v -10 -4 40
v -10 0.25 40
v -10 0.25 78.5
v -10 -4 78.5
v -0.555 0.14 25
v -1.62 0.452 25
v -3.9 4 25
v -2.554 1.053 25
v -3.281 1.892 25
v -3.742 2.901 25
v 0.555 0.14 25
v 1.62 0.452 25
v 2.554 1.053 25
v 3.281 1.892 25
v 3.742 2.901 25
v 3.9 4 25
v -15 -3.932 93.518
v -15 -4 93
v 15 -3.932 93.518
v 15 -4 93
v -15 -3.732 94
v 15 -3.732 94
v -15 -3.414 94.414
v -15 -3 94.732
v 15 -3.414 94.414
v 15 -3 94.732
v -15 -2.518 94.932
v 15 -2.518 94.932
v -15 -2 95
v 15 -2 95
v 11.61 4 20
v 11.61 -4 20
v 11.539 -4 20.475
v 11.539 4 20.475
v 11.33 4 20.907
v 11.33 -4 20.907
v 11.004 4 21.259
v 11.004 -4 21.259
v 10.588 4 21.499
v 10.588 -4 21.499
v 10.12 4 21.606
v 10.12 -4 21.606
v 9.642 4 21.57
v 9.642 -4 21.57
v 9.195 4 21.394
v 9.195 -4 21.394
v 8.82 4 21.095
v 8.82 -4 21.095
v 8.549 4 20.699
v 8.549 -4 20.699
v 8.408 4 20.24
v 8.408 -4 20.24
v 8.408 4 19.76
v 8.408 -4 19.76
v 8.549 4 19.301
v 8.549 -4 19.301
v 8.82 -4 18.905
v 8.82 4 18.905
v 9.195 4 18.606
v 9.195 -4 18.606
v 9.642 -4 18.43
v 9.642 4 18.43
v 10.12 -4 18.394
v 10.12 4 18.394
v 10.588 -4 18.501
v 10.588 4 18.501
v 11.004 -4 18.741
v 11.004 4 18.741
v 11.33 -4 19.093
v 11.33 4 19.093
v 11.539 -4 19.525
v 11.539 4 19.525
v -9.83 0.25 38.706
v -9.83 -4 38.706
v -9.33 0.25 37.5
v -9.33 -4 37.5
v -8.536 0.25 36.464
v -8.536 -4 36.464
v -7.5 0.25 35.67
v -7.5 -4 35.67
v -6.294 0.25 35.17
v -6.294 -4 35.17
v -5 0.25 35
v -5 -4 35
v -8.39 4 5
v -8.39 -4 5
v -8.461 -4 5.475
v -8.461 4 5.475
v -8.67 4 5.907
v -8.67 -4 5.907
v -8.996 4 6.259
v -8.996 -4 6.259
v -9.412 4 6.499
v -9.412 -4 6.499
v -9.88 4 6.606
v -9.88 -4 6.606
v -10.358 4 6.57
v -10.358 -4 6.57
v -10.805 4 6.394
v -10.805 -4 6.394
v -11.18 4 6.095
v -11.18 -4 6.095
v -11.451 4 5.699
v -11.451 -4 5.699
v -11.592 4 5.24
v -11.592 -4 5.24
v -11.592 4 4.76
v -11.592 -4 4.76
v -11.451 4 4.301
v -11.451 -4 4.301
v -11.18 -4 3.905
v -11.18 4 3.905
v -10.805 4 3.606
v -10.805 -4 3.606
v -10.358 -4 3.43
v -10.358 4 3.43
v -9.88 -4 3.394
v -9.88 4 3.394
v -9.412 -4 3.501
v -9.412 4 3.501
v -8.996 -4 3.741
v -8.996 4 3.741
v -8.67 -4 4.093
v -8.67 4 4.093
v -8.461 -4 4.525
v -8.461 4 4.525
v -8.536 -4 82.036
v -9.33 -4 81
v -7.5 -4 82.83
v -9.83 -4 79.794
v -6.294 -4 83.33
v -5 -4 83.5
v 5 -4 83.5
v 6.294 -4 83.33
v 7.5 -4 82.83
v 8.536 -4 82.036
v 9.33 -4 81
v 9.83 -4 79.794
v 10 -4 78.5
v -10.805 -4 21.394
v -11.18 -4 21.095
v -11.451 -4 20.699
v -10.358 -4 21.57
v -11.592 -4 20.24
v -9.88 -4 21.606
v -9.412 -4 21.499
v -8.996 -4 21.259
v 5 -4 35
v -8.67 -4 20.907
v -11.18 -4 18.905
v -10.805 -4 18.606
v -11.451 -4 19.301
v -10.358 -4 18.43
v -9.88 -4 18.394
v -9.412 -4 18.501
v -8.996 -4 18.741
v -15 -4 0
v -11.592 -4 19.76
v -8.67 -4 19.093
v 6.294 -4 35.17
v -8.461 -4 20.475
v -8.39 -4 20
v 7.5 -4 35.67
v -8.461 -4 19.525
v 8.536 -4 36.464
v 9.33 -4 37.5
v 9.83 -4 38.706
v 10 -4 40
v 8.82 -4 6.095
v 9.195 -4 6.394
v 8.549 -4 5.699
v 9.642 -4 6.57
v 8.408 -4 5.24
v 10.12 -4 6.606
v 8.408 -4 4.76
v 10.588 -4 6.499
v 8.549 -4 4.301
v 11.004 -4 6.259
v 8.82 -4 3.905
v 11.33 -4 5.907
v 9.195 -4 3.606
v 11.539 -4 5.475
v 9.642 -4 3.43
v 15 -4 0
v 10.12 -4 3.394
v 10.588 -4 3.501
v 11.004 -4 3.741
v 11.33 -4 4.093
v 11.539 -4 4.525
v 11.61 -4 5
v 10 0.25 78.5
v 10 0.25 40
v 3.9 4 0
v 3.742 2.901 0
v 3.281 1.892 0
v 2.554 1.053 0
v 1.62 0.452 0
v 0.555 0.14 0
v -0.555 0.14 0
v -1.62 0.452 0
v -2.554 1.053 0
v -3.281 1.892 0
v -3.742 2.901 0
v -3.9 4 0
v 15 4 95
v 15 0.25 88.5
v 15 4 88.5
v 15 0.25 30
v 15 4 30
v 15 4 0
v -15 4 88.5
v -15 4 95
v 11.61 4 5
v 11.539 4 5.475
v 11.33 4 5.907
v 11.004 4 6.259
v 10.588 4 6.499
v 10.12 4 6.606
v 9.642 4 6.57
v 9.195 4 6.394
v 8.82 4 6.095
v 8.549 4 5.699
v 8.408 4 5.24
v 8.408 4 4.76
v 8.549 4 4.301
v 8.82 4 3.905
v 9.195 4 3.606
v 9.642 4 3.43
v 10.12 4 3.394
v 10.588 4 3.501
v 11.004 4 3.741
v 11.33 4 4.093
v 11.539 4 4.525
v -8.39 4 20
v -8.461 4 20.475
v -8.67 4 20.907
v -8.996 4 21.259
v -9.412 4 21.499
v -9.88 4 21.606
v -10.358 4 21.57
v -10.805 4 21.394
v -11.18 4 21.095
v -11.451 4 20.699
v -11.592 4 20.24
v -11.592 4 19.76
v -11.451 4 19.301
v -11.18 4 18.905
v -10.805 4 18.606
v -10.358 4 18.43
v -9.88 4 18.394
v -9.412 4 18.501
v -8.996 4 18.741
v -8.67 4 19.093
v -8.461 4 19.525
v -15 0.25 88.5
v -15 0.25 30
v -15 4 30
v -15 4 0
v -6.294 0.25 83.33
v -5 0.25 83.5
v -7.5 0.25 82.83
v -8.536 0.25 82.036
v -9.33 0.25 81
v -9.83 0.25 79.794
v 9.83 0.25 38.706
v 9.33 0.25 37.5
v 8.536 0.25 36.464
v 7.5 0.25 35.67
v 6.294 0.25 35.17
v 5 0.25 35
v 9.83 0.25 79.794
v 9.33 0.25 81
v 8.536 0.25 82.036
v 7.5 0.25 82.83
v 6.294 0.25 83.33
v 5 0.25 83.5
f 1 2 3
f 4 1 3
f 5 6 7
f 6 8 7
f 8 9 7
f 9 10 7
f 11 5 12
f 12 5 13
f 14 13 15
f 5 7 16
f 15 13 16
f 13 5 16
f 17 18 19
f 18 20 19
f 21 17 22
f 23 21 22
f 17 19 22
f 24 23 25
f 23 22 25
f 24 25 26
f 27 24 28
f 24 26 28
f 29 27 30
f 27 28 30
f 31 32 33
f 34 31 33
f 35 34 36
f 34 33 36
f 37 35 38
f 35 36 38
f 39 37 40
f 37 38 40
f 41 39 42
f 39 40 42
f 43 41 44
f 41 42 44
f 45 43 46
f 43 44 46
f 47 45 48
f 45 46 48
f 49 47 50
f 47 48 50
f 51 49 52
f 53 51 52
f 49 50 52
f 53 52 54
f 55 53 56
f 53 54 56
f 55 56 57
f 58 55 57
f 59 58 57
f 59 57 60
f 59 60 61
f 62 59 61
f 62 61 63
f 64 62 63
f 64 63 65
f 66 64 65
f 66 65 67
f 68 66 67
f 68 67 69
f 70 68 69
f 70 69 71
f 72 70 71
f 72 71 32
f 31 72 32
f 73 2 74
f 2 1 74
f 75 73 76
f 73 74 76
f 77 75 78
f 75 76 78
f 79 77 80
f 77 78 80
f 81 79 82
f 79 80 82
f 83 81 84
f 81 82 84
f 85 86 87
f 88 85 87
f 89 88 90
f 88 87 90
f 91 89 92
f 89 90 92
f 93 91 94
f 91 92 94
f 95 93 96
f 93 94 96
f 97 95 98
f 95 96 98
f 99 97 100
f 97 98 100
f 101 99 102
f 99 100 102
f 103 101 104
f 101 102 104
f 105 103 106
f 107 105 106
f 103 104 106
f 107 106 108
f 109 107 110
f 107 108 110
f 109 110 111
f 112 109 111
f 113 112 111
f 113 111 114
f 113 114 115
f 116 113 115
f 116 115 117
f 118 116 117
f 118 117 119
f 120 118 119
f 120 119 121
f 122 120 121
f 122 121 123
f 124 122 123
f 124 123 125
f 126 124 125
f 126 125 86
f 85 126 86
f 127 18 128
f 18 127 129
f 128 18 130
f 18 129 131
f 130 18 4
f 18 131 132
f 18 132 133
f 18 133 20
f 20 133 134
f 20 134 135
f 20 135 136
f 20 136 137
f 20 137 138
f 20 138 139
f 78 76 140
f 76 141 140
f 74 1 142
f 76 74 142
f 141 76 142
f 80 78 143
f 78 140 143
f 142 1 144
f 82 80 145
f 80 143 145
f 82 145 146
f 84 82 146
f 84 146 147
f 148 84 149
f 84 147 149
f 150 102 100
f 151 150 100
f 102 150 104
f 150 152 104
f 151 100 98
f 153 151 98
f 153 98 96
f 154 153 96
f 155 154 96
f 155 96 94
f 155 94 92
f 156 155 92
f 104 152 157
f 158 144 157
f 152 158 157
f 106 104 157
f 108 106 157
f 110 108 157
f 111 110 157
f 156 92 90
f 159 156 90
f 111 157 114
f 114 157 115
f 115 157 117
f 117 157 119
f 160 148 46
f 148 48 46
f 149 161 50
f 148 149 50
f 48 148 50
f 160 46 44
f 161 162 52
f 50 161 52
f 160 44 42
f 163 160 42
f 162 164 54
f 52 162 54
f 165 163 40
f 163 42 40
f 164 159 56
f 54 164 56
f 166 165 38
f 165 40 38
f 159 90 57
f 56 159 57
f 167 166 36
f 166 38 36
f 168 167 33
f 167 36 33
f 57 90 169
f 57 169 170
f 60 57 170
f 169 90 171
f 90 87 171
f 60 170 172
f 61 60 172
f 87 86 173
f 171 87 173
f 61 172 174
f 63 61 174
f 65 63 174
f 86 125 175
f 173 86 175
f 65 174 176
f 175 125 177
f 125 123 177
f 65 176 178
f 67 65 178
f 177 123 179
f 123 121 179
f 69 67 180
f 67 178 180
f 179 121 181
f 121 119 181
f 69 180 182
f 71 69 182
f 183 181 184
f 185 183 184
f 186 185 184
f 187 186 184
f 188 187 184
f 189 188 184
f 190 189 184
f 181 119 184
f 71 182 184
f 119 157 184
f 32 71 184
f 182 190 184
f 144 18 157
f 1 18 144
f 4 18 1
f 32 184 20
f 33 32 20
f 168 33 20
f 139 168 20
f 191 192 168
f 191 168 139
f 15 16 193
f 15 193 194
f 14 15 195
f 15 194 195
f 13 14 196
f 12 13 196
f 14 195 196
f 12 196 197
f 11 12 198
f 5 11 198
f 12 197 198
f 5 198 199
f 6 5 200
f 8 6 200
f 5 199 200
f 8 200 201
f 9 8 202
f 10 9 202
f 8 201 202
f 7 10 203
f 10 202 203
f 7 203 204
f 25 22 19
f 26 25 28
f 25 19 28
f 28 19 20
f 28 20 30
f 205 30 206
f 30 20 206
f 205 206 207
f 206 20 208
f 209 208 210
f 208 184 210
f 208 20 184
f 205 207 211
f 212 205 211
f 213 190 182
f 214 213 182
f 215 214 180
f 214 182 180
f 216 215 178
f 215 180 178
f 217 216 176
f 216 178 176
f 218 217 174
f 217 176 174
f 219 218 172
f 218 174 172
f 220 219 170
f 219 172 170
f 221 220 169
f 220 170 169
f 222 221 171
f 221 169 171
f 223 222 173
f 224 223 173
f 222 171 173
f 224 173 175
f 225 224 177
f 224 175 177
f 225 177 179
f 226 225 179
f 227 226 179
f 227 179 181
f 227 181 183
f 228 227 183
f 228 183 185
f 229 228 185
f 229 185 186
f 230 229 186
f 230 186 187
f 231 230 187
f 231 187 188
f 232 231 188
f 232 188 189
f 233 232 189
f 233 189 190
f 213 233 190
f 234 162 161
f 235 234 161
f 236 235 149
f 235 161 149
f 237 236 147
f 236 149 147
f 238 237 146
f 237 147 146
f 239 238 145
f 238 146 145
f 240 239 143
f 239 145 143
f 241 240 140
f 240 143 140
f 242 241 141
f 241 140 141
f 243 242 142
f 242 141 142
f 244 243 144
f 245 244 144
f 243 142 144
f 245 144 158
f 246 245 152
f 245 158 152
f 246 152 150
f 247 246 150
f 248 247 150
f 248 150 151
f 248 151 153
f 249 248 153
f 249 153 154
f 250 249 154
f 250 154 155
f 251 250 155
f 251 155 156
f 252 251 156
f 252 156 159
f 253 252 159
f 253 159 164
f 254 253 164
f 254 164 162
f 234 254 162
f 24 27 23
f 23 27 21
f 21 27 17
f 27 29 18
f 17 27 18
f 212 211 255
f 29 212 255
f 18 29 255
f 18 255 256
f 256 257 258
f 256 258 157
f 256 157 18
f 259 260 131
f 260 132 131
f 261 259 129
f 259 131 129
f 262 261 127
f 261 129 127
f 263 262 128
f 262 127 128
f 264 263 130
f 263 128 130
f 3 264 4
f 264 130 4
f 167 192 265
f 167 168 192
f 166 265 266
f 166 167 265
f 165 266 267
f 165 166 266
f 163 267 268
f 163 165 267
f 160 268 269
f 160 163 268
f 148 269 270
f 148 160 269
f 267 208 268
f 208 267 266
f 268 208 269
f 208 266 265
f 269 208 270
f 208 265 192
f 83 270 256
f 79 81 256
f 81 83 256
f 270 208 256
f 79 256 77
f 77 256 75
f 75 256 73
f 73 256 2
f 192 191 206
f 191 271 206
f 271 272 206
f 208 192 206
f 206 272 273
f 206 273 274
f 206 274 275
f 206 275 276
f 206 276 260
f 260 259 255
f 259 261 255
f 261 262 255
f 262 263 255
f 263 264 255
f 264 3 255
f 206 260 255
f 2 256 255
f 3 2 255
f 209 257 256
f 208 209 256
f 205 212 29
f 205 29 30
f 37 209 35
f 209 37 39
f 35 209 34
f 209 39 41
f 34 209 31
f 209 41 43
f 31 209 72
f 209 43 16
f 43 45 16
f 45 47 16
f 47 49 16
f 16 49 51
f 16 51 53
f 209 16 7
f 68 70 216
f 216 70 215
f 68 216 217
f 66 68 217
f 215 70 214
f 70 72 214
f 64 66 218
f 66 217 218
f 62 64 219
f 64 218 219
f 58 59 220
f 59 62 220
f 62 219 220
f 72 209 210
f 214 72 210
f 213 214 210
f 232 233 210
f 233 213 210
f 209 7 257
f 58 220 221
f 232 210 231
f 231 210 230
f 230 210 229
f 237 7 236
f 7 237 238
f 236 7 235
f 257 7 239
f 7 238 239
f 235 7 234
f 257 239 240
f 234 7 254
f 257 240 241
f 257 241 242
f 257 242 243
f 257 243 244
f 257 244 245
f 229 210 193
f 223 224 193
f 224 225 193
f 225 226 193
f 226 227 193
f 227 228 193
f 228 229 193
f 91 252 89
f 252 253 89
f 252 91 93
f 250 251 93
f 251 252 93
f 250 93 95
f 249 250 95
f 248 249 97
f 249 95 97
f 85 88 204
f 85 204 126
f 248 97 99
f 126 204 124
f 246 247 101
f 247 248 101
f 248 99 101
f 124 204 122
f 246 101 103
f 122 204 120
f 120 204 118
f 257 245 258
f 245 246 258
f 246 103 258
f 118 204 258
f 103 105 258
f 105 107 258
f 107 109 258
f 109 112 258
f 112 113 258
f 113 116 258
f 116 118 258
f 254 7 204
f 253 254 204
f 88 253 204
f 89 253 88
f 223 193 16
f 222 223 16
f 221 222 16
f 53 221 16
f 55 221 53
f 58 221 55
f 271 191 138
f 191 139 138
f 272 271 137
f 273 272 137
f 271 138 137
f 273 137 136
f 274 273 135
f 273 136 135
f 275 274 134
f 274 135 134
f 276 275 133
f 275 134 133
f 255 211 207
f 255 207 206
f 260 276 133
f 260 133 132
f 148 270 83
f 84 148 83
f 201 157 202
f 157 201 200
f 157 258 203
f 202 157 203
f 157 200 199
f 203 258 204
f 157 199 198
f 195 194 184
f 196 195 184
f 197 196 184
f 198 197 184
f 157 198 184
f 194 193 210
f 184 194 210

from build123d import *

# Parameters (mm, degrees)
F1_DEPTH = 25
F2_R     = 1.6101418037
F3_DEPTH = 25
F5_DEPTH = 70
F6_W     = 3.75
F6_H     = 58.5
F7_DEPTH = 30.001
F8_W     = 20
F8_H     = 48.5
F9_DEPTH = 25
F10_R    = 5
F11_R    = 2


with BuildPart() as f1:
    # F0 (on Top) → F1 (new body)
    with BuildSketch(Plane.XY):
        with BuildLine():
            Line((15, 4), (3.9, 4))
            ThreePointArc((3.9, 4), (0, 0.1), (-3.9, 4))
            Line((-3.9, 4), (-15, 4))
            Line((-15, 4), (-15, -4))
            Line((-15, -4), (15, -4))
            Line((15, -4), (15, 4))
        make_face()
    extrude(amount=F1_DEPTH)

    # F2 (on face) → F3 (cut)
    with BuildSketch(Plane.XZ.offset(4)):
        with Locations((-10, 20)):
            Circle(F2_R)
        with Locations((-10, 5)):
            Circle(F2_R)
        with Locations((10, 20)):
            Circle(F2_R)
        with Locations((10, 5)):
            Circle(F2_R)
    extrude(amount=-F3_DEPTH, mode=Mode.SUBTRACT)

    # F4 (on face) → F5 (join)
    with BuildSketch(Plane.XY.offset(25)):
        with BuildLine():
            Line((-15, 4), (-15, -4))
            Line((-15, -4), (15, -4))
            Line((15, -4), (15, 4))
            Line((15, 4), (3.9, 4))
            ThreePointArc((3.9, 4), (0, 0.1), (-3.9, 4))
            Line((-3.9, 4), (-15, 4))
        make_face()
        with BuildLine():
            Line((3.9, 4), (-3.9, 4))
            ThreePointArc((-3.9, 4), (0, 0.1), (3.9, 4))
        make_face()
    extrude(amount=F5_DEPTH)

    # F6 (on face) → F7 (cut, through all)
    with BuildSketch(Plane(origin=(-15, 0, 0), x_dir=(0, -1, 0), z_dir=(-1, 0, 0))):
        with Locations((-2.125, 59.25)):
            Rectangle(F6_W, F6_H)
    extrude(amount=-F7_DEPTH, mode=Mode.SUBTRACT)

    # F8 (on face) → F9 (cut)
    with BuildSketch(Plane(origin=(0, 0.25, 0), x_dir=(-1, 0, 0), z_dir=(0, 1, 0))):
        with Locations((0, 59.25)):
            Rectangle(F8_W, F8_H)
    extrude(amount=-F9_DEPTH, mode=Mode.SUBTRACT)

    # F10
    f10_edges = [f1.edges().sort_by_distance(p)[0] for p in [
        (10, -1.875, 35),
        (-10, -1.875, 83.5),
        (-10, -1.875, 35),
        (10, -1.875, 83.5),
    ]]
    fillet(f10_edges, radius=F10_R)

    # F11
    f11_edges = [f1.edges().sort_by_distance(p)[0] for p in [
        (0, -4, 95),
    ]]
    fillet(f11_edges, radius=F11_R)


solid = f1.part
